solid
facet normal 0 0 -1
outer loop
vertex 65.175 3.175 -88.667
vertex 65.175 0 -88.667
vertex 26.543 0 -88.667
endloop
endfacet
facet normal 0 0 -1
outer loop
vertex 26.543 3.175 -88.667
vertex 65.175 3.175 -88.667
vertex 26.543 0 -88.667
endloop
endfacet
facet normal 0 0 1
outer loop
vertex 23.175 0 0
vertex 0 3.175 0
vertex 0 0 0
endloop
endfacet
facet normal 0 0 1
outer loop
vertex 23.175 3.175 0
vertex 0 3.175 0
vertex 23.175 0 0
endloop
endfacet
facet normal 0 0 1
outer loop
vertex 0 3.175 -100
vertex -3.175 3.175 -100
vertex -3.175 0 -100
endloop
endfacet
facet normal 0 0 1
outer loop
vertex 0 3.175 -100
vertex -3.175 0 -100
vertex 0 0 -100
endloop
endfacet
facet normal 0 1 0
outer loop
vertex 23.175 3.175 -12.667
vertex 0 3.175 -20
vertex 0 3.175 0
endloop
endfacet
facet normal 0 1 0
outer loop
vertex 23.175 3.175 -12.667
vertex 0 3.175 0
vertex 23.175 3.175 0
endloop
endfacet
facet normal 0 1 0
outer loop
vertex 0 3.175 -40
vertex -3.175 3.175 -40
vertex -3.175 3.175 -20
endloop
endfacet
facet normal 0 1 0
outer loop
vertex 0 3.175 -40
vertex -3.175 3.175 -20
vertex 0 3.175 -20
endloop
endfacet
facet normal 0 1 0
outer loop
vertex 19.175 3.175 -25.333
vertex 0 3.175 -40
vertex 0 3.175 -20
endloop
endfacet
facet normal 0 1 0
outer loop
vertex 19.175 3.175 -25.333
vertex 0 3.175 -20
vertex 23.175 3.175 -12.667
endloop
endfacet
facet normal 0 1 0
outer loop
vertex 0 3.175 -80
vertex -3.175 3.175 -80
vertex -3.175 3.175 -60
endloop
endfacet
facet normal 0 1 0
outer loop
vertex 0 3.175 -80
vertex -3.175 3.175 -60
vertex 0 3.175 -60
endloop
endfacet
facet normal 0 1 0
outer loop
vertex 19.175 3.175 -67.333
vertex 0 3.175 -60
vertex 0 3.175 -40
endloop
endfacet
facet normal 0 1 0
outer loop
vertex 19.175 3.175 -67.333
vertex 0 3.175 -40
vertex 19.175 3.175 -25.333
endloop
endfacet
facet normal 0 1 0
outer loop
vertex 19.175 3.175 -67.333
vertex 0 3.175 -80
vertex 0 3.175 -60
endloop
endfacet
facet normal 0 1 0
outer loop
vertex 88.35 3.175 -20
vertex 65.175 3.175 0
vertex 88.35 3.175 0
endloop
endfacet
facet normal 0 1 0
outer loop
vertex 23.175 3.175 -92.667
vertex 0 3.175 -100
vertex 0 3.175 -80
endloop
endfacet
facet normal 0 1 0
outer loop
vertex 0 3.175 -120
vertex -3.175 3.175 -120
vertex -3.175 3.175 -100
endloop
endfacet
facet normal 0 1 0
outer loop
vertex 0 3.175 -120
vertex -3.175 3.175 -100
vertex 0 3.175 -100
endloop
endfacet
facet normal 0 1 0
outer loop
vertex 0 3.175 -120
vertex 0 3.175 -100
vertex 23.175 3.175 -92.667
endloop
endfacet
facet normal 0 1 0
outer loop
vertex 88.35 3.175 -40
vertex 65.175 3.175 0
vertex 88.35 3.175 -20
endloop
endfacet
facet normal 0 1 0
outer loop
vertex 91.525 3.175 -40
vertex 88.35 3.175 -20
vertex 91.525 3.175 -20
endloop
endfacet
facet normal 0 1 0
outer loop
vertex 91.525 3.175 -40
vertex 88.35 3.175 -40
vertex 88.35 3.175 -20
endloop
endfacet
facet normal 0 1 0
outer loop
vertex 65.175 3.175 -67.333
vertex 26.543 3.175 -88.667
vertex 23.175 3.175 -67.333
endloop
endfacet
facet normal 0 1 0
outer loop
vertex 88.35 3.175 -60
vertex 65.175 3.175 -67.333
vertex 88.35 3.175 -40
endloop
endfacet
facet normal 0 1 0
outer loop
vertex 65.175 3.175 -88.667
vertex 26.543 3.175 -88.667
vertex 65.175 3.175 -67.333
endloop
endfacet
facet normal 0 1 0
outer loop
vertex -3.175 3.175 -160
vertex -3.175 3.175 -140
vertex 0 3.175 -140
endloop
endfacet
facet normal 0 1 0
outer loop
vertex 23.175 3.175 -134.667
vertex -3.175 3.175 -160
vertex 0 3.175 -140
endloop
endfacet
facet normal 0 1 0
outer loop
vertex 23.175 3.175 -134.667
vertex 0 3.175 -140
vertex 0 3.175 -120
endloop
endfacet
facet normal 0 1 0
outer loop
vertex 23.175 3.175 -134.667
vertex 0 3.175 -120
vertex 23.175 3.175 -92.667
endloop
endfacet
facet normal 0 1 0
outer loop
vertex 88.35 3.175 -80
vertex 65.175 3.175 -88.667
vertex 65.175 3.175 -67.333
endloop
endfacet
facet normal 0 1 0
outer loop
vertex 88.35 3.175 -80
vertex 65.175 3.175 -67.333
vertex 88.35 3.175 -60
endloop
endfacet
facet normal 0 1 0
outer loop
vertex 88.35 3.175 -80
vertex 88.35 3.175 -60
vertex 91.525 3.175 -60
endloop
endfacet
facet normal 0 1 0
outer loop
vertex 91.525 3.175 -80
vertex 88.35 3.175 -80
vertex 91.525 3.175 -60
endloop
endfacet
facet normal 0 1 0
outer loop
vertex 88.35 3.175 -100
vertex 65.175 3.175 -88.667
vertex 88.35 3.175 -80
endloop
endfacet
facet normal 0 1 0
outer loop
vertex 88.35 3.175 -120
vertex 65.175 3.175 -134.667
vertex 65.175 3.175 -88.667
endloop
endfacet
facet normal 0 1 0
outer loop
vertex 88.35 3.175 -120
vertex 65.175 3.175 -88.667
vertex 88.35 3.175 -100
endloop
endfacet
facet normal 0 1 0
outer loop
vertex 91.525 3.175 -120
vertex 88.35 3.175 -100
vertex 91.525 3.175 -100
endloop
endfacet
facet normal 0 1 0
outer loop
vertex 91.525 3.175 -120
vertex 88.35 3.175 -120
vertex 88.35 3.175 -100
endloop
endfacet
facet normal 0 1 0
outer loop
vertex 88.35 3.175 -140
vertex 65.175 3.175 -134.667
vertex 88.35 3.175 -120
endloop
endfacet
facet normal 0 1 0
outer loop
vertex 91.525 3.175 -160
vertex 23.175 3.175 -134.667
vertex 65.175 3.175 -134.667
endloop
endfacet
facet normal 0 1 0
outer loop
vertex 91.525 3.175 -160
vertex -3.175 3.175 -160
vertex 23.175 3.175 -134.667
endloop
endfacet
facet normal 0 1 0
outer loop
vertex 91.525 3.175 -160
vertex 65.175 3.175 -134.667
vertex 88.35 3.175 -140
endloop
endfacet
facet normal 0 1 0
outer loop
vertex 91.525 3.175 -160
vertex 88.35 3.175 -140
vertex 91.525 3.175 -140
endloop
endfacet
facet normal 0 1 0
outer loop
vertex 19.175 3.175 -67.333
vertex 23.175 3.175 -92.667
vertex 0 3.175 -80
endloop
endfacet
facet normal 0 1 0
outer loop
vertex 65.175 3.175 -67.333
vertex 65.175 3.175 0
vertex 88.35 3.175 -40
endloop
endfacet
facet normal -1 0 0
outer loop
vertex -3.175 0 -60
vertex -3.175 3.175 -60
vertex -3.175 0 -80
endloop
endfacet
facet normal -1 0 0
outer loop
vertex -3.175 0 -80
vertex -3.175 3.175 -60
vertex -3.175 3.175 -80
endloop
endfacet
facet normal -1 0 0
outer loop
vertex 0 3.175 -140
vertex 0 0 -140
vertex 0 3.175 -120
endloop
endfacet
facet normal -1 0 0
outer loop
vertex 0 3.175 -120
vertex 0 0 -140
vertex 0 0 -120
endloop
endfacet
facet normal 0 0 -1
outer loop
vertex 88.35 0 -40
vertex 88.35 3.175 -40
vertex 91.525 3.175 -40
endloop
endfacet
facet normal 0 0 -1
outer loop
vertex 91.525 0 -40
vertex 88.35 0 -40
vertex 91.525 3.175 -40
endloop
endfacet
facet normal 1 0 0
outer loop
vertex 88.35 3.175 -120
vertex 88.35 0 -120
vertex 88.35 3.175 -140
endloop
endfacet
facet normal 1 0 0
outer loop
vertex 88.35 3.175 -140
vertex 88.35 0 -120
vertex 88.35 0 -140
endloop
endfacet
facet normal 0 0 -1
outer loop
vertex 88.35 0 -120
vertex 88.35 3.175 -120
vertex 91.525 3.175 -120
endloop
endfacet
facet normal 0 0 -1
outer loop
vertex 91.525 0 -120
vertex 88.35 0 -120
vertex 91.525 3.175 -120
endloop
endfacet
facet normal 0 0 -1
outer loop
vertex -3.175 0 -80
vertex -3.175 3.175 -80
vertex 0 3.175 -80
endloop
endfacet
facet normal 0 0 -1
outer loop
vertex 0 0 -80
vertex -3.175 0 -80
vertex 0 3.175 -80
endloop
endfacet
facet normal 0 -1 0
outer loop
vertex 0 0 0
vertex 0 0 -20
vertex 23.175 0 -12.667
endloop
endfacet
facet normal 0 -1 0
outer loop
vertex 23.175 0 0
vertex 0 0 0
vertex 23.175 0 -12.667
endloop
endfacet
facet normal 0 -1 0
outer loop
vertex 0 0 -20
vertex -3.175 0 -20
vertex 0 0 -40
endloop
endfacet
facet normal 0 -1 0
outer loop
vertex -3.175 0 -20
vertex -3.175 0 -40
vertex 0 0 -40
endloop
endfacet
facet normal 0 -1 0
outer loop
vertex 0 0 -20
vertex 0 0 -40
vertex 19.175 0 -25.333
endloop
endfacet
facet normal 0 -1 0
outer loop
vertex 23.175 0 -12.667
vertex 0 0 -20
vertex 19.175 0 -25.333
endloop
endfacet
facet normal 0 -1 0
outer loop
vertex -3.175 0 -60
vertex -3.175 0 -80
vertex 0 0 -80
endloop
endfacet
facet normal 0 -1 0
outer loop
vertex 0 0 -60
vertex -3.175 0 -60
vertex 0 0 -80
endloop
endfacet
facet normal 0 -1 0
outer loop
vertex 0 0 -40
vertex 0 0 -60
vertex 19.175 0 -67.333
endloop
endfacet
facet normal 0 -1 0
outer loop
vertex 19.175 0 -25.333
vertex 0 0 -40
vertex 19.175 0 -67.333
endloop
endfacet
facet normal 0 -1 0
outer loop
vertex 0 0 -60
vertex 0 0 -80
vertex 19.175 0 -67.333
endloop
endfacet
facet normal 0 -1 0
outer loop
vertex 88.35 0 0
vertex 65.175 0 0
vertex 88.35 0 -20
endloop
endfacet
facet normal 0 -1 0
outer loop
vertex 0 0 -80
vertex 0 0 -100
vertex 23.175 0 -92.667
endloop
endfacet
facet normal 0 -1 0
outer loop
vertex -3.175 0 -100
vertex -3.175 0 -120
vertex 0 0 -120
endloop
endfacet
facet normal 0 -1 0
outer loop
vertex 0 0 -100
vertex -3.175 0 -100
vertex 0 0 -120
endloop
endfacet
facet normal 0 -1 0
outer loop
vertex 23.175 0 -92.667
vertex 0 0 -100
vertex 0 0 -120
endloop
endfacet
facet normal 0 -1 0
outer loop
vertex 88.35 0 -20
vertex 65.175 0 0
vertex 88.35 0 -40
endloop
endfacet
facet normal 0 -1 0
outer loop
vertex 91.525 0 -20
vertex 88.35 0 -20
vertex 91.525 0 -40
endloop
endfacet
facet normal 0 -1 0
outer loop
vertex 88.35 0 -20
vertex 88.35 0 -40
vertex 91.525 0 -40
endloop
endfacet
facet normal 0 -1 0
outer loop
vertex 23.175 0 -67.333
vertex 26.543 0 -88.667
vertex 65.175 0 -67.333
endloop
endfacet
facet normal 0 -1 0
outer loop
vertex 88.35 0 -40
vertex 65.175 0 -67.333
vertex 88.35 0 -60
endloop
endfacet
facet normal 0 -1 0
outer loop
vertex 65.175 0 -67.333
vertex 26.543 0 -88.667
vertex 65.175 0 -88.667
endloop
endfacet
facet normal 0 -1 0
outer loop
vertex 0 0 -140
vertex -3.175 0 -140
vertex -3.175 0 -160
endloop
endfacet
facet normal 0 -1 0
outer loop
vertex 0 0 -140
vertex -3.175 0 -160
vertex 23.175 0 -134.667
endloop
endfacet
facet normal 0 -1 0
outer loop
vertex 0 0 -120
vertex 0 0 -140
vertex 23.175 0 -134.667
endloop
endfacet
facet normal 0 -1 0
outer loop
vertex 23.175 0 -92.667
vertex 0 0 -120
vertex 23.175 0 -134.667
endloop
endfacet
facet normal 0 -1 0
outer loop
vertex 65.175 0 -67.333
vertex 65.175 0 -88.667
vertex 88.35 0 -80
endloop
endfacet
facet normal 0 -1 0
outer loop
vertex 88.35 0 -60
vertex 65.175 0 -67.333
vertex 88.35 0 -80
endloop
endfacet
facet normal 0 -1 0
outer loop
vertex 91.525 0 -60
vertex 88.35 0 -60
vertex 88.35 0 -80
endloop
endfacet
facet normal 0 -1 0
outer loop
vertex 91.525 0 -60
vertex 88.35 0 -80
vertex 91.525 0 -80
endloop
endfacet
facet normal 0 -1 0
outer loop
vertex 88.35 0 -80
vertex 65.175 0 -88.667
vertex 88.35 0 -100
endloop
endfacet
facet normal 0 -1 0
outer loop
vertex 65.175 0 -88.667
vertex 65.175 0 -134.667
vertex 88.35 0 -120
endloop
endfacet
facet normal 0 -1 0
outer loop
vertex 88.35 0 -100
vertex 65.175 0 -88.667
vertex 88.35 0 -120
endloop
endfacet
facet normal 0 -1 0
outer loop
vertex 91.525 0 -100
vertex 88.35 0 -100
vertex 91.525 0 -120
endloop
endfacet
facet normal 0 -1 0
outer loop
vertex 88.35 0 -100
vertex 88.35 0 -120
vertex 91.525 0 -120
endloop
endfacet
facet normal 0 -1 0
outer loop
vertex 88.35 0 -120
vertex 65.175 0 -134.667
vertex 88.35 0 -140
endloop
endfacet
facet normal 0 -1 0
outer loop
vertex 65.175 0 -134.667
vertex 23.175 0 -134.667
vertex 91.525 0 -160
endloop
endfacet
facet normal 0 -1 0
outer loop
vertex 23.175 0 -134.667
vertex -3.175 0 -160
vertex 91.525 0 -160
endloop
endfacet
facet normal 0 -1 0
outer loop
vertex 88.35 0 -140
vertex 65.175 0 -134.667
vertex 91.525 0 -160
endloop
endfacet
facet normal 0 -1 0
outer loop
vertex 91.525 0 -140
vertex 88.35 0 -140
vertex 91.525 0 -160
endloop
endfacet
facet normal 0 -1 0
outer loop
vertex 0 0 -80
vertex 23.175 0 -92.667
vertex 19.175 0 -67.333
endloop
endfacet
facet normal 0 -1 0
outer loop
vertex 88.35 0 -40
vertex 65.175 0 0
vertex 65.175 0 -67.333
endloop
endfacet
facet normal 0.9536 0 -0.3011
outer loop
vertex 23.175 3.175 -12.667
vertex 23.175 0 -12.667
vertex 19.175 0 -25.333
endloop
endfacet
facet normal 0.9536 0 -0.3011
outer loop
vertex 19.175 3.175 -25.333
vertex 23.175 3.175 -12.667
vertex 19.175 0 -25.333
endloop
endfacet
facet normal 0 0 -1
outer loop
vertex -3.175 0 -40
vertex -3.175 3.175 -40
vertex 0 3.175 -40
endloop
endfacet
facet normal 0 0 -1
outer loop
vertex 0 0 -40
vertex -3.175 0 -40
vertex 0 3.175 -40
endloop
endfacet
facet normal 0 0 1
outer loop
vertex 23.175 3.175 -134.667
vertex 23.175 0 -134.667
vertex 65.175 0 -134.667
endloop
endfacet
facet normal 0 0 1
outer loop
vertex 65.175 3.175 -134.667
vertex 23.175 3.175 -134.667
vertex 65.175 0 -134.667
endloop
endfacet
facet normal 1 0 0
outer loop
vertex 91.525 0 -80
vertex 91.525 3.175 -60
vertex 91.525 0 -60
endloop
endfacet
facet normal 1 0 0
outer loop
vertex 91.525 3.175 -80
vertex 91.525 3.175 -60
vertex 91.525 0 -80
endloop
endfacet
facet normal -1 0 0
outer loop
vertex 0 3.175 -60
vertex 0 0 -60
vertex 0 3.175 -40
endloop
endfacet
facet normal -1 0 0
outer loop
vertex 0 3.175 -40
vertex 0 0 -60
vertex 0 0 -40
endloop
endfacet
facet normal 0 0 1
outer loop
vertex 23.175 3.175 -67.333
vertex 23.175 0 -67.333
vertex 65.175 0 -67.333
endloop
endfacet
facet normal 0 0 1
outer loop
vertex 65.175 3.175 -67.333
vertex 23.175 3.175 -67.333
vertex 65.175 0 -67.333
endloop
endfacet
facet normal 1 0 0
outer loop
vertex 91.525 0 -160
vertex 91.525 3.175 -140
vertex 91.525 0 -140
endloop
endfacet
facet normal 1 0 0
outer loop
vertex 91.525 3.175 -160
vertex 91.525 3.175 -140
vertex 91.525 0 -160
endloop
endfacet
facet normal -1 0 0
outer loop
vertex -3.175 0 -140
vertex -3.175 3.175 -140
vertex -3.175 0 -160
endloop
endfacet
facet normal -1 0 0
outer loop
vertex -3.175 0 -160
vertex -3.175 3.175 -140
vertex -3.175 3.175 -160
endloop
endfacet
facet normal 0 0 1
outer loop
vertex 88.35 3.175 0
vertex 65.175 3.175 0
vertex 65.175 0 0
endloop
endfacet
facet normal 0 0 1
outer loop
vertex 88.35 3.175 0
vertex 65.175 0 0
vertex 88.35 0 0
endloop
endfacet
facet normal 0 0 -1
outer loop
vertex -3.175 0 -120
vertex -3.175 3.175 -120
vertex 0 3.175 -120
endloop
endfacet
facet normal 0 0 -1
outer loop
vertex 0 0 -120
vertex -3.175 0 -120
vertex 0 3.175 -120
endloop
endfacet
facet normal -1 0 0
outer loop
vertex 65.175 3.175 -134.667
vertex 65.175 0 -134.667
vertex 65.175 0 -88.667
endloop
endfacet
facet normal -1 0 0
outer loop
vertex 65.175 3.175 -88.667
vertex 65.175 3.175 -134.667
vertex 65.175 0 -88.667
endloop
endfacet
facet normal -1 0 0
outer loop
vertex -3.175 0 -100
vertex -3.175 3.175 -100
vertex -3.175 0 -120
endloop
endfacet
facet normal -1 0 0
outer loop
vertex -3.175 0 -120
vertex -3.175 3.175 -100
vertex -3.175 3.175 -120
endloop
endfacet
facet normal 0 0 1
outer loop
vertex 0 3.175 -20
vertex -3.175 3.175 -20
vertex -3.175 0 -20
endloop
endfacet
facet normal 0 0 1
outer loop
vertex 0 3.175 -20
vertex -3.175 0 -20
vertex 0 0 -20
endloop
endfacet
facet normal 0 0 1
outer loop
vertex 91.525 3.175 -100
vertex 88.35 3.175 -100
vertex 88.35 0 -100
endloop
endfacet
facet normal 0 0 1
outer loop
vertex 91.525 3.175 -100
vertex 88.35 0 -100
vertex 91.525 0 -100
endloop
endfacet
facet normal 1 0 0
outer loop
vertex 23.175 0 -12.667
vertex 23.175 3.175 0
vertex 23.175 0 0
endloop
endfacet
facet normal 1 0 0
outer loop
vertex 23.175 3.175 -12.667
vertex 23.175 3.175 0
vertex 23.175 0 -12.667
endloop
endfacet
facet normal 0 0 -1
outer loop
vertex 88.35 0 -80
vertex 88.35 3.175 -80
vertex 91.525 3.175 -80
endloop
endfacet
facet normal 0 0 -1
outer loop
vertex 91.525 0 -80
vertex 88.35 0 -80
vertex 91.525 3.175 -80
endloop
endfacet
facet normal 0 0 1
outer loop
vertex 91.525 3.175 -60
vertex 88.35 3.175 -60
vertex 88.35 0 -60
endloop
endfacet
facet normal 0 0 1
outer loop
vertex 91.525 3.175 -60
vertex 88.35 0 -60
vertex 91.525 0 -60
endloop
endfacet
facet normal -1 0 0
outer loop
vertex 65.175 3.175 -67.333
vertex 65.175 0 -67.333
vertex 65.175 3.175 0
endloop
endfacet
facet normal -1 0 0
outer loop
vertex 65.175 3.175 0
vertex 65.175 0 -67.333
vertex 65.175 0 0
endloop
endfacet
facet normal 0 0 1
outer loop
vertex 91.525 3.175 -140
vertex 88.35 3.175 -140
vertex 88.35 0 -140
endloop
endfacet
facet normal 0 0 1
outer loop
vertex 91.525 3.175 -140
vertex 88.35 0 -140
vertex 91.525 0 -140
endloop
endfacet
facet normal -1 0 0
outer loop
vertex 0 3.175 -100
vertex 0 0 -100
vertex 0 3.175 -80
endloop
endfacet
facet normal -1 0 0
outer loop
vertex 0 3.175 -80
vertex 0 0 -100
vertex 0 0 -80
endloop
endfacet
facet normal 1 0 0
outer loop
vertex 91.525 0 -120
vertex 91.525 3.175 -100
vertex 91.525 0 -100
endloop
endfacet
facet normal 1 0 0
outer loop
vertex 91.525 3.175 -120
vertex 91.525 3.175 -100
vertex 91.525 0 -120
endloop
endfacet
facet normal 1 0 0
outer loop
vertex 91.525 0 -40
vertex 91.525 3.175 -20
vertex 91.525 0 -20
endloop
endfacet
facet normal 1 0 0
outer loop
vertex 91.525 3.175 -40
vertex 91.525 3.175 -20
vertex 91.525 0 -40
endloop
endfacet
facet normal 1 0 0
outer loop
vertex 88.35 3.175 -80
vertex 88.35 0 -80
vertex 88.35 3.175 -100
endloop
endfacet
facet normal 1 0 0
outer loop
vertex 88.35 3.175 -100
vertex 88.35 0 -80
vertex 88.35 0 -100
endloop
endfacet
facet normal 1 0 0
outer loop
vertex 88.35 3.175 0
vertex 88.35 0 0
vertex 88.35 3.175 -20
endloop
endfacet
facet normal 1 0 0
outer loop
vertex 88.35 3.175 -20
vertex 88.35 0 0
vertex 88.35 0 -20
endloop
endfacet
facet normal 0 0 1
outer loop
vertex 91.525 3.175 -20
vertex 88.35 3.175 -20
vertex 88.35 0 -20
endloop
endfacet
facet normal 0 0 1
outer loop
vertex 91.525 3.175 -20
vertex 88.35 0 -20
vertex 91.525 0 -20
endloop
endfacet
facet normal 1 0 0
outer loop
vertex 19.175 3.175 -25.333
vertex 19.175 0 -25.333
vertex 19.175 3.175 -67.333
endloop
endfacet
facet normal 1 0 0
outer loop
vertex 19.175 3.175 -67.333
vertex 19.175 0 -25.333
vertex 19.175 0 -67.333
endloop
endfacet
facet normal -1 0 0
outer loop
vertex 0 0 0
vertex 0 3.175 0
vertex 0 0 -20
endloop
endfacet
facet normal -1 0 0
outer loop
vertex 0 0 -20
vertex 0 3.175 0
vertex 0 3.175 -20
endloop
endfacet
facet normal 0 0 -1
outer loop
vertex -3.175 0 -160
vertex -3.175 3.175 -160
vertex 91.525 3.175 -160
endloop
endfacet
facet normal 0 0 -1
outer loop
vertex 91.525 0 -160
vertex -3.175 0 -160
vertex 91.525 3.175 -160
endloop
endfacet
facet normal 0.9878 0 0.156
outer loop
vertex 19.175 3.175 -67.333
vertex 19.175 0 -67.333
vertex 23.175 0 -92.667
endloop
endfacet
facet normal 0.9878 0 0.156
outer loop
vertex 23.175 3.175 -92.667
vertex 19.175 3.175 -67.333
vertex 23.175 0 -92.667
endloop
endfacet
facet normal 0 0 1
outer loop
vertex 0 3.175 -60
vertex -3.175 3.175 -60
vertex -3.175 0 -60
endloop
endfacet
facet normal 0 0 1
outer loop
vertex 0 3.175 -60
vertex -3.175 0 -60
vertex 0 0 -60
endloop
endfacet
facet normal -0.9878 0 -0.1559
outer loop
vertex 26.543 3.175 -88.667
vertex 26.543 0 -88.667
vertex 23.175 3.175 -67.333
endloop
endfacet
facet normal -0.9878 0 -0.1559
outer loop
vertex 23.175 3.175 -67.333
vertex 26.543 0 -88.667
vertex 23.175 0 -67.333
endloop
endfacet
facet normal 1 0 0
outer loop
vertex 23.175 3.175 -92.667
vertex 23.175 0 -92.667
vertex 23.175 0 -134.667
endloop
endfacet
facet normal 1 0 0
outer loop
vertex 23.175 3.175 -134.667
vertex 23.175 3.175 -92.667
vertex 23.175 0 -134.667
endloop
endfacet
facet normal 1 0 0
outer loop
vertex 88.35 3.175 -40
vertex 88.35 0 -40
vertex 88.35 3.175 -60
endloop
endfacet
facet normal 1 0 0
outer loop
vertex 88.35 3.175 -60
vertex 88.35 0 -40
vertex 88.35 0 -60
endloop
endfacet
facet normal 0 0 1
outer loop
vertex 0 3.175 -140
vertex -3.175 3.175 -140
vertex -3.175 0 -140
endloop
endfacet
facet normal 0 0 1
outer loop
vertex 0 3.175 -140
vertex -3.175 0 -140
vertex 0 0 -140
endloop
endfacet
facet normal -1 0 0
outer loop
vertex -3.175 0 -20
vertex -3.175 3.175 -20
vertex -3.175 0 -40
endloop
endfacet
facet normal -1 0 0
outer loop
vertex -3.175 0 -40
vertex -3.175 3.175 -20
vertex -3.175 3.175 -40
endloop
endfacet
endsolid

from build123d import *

# Parameters (mm, degrees)
BOSS_EXTRUDE1_DEPTH = 3.175
SKETCH3_W           = 15
SKETCH3_H           = 20
SKETCH3_R           = 3.5
BOSS_EXTRUDE3_DEPTH = 3.175
SKETCH4_W           = 23.175
SKETCH4_H           = 6.096
BOSS_EXTRUDE4_DEPTH = 3.175
SKETCH5_W           = 11.825
SKETCH5_H           = 166.096
CUT_EXTRUDE1_DEPTH  = 191.502764088
SKETCH6_W           = 88.35
SKETCH6_H           = 6.096
CUT_EXTRUDE2_DEPTH  = 185.355380312


with BuildPart() as part:
    # Sketch1 → Boss-Extrude1 (new body)
    with BuildSketch(Plane(origin=(0, 0, 0), x_dir=(1, 0, 0), z_dir=(0, 1, 0))):
        Polygon((0, 160), (0, 0), (23.175, 0), (23.175, 12.666666667), (19.175, 25.333333333), (19.175, 67.333333333), (23.175, 92.666666667), (23.175, 134.666666667), (65.175, 134.666666667), (65.175, 92.666666667), (65.175, 88.666666667), (26.543421053, 88.666666667), (23.175, 67.333333333), (65.175, 67.333333333), (65.175, 25.333333333), (65.175, 0), (88.35, 0), (88.35, 160), align=None)
    extrude(amount=BOSS_EXTRUDE1_DEPTH)

    # Sketch3 → Boss-Extrude3 (add)
    # profile 1 of 8: a face of its own
    with BuildSketch(Plane(origin=(0, 3.175, 0), x_dir=(1, 0, 0), z_dir=(0, 1, 0))):
        with Locations((-7.5, 150)):
            Rectangle(SKETCH3_W, SKETCH3_H)
        with Locations(Location((-7.5, 150, 0), (0, 0, 270))):
            Circle(SKETCH3_R, mode=Mode.SUBTRACT)
    # profile 2 of 8: a face of its own
    with BuildSketch(Plane(origin=(0, 3.175, 0), x_dir=(1, 0, 0), z_dir=(0, 1, 0))):
        with Locations((-7.5, 110)):
            Rectangle(SKETCH3_W, SKETCH3_H)
        with Locations(Location((-7.5, 110, 0), (0, 0, 270))):
            Circle(SKETCH3_R, mode=Mode.SUBTRACT)
    # profile 3 of 8: a face of its own
    with BuildSketch(Plane(origin=(0, 3.175, 0), x_dir=(1, 0, 0), z_dir=(0, 1, 0))):
        with Locations((-7.5, 70)):
            Rectangle(SKETCH3_W, SKETCH3_H)
        with Locations(Location((-7.5, 70, 0), (0, 0, 270))):
            Circle(SKETCH3_R, mode=Mode.SUBTRACT)
    # profile 4 of 8: a face of its own
    with BuildSketch(Plane(origin=(0, 3.175, 0), x_dir=(1, 0, 0), z_dir=(0, 1, 0))):
        with Locations((-7.5, 30)):
            Rectangle(SKETCH3_W, SKETCH3_H)
        with Locations(Location((-7.5, 30, 0), (0, 0, 270))):
            Circle(SKETCH3_R, mode=Mode.SUBTRACT)
    # profile 5 of 8: a face of its own
    with BuildSketch(Plane(origin=(0, 3.175, 0), x_dir=(1, 0, 0), z_dir=(0, 1, 0))):
        with Locations((95.85, 30)):
            Rectangle(SKETCH3_W, SKETCH3_H)
        with Locations(Location((95.85, 30, 0), (0, 0, 270))):
            Circle(SKETCH3_R, mode=Mode.SUBTRACT)
    # profile 6 of 8: a face of its own
    with BuildSketch(Plane(origin=(0, 3.175, 0), x_dir=(1, 0, 0), z_dir=(0, 1, 0))):
        with Locations((95.85, 70)):
            Rectangle(SKETCH3_W, SKETCH3_H)
        with Locations(Location((95.85, 70, 0), (0, 0, 270))):
            Circle(SKETCH3_R, mode=Mode.SUBTRACT)
    # profile 7 of 8: a face of its own
    with BuildSketch(Plane(origin=(0, 3.175, 0), x_dir=(1, 0, 0), z_dir=(0, 1, 0))):
        with Locations((95.85, 110)):
            Rectangle(SKETCH3_W, SKETCH3_H)
        with Locations(Location((95.85, 110, 0), (0, 0, 270))):
            Circle(SKETCH3_R, mode=Mode.SUBTRACT)
    # profile 8 of 8: a face of its own
    with BuildSketch(Plane(origin=(0, 3.175, 0), x_dir=(1, 0, 0), z_dir=(0, 1, 0))):
        with Locations((95.85, 150)):
            Rectangle(SKETCH3_W, SKETCH3_H)
        with Locations(Location((95.85, 150, 0), (0, 0, 270))):
            Circle(SKETCH3_R, mode=Mode.SUBTRACT)
    extrude(amount=-BOSS_EXTRUDE3_DEPTH)

    # Sketch4 → Boss-Extrude4 (add)
    with BuildSketch(Plane(origin=(0, 3.175, 0), x_dir=(1, 0, 0), z_dir=(0, 1, 0))):
        with Locations((11.5875, -3.048)):
            Rectangle(SKETCH4_W, SKETCH4_H)
        with Locations((76.7625, -3.048)):
            Rectangle(SKETCH4_W, SKETCH4_H)
    extrude(amount=-BOSS_EXTRUDE4_DEPTH)

    # Sketch5 → Cut-Extrude1 (cut, through all)
    with BuildSketch(Plane(origin=(0, 3.175, 0), x_dir=(1, 0, 0), z_dir=(0, 1, 0))):
        with Locations((-9.0875, 76.952)):
            Rectangle(SKETCH5_W, SKETCH5_H)
        with Locations((97.4375, 76.952)):
            Rectangle(SKETCH5_W, SKETCH5_H)
    extrude(amount=-CUT_EXTRUDE1_DEPTH, mode=Mode.SUBTRACT)

    # Sketch6 → Cut-Extrude2 (cut, through all)
    with BuildSketch(Plane(origin=(0, 3.175, 0), x_dir=(1, 0, 0), z_dir=(0, 1, 0))):
        with Locations((44.175, -3.048)):
            Rectangle(SKETCH6_W, SKETCH6_H)
    extrude(amount=-CUT_EXTRUDE2_DEPTH, mode=Mode.SUBTRACT)


solid = part.part
